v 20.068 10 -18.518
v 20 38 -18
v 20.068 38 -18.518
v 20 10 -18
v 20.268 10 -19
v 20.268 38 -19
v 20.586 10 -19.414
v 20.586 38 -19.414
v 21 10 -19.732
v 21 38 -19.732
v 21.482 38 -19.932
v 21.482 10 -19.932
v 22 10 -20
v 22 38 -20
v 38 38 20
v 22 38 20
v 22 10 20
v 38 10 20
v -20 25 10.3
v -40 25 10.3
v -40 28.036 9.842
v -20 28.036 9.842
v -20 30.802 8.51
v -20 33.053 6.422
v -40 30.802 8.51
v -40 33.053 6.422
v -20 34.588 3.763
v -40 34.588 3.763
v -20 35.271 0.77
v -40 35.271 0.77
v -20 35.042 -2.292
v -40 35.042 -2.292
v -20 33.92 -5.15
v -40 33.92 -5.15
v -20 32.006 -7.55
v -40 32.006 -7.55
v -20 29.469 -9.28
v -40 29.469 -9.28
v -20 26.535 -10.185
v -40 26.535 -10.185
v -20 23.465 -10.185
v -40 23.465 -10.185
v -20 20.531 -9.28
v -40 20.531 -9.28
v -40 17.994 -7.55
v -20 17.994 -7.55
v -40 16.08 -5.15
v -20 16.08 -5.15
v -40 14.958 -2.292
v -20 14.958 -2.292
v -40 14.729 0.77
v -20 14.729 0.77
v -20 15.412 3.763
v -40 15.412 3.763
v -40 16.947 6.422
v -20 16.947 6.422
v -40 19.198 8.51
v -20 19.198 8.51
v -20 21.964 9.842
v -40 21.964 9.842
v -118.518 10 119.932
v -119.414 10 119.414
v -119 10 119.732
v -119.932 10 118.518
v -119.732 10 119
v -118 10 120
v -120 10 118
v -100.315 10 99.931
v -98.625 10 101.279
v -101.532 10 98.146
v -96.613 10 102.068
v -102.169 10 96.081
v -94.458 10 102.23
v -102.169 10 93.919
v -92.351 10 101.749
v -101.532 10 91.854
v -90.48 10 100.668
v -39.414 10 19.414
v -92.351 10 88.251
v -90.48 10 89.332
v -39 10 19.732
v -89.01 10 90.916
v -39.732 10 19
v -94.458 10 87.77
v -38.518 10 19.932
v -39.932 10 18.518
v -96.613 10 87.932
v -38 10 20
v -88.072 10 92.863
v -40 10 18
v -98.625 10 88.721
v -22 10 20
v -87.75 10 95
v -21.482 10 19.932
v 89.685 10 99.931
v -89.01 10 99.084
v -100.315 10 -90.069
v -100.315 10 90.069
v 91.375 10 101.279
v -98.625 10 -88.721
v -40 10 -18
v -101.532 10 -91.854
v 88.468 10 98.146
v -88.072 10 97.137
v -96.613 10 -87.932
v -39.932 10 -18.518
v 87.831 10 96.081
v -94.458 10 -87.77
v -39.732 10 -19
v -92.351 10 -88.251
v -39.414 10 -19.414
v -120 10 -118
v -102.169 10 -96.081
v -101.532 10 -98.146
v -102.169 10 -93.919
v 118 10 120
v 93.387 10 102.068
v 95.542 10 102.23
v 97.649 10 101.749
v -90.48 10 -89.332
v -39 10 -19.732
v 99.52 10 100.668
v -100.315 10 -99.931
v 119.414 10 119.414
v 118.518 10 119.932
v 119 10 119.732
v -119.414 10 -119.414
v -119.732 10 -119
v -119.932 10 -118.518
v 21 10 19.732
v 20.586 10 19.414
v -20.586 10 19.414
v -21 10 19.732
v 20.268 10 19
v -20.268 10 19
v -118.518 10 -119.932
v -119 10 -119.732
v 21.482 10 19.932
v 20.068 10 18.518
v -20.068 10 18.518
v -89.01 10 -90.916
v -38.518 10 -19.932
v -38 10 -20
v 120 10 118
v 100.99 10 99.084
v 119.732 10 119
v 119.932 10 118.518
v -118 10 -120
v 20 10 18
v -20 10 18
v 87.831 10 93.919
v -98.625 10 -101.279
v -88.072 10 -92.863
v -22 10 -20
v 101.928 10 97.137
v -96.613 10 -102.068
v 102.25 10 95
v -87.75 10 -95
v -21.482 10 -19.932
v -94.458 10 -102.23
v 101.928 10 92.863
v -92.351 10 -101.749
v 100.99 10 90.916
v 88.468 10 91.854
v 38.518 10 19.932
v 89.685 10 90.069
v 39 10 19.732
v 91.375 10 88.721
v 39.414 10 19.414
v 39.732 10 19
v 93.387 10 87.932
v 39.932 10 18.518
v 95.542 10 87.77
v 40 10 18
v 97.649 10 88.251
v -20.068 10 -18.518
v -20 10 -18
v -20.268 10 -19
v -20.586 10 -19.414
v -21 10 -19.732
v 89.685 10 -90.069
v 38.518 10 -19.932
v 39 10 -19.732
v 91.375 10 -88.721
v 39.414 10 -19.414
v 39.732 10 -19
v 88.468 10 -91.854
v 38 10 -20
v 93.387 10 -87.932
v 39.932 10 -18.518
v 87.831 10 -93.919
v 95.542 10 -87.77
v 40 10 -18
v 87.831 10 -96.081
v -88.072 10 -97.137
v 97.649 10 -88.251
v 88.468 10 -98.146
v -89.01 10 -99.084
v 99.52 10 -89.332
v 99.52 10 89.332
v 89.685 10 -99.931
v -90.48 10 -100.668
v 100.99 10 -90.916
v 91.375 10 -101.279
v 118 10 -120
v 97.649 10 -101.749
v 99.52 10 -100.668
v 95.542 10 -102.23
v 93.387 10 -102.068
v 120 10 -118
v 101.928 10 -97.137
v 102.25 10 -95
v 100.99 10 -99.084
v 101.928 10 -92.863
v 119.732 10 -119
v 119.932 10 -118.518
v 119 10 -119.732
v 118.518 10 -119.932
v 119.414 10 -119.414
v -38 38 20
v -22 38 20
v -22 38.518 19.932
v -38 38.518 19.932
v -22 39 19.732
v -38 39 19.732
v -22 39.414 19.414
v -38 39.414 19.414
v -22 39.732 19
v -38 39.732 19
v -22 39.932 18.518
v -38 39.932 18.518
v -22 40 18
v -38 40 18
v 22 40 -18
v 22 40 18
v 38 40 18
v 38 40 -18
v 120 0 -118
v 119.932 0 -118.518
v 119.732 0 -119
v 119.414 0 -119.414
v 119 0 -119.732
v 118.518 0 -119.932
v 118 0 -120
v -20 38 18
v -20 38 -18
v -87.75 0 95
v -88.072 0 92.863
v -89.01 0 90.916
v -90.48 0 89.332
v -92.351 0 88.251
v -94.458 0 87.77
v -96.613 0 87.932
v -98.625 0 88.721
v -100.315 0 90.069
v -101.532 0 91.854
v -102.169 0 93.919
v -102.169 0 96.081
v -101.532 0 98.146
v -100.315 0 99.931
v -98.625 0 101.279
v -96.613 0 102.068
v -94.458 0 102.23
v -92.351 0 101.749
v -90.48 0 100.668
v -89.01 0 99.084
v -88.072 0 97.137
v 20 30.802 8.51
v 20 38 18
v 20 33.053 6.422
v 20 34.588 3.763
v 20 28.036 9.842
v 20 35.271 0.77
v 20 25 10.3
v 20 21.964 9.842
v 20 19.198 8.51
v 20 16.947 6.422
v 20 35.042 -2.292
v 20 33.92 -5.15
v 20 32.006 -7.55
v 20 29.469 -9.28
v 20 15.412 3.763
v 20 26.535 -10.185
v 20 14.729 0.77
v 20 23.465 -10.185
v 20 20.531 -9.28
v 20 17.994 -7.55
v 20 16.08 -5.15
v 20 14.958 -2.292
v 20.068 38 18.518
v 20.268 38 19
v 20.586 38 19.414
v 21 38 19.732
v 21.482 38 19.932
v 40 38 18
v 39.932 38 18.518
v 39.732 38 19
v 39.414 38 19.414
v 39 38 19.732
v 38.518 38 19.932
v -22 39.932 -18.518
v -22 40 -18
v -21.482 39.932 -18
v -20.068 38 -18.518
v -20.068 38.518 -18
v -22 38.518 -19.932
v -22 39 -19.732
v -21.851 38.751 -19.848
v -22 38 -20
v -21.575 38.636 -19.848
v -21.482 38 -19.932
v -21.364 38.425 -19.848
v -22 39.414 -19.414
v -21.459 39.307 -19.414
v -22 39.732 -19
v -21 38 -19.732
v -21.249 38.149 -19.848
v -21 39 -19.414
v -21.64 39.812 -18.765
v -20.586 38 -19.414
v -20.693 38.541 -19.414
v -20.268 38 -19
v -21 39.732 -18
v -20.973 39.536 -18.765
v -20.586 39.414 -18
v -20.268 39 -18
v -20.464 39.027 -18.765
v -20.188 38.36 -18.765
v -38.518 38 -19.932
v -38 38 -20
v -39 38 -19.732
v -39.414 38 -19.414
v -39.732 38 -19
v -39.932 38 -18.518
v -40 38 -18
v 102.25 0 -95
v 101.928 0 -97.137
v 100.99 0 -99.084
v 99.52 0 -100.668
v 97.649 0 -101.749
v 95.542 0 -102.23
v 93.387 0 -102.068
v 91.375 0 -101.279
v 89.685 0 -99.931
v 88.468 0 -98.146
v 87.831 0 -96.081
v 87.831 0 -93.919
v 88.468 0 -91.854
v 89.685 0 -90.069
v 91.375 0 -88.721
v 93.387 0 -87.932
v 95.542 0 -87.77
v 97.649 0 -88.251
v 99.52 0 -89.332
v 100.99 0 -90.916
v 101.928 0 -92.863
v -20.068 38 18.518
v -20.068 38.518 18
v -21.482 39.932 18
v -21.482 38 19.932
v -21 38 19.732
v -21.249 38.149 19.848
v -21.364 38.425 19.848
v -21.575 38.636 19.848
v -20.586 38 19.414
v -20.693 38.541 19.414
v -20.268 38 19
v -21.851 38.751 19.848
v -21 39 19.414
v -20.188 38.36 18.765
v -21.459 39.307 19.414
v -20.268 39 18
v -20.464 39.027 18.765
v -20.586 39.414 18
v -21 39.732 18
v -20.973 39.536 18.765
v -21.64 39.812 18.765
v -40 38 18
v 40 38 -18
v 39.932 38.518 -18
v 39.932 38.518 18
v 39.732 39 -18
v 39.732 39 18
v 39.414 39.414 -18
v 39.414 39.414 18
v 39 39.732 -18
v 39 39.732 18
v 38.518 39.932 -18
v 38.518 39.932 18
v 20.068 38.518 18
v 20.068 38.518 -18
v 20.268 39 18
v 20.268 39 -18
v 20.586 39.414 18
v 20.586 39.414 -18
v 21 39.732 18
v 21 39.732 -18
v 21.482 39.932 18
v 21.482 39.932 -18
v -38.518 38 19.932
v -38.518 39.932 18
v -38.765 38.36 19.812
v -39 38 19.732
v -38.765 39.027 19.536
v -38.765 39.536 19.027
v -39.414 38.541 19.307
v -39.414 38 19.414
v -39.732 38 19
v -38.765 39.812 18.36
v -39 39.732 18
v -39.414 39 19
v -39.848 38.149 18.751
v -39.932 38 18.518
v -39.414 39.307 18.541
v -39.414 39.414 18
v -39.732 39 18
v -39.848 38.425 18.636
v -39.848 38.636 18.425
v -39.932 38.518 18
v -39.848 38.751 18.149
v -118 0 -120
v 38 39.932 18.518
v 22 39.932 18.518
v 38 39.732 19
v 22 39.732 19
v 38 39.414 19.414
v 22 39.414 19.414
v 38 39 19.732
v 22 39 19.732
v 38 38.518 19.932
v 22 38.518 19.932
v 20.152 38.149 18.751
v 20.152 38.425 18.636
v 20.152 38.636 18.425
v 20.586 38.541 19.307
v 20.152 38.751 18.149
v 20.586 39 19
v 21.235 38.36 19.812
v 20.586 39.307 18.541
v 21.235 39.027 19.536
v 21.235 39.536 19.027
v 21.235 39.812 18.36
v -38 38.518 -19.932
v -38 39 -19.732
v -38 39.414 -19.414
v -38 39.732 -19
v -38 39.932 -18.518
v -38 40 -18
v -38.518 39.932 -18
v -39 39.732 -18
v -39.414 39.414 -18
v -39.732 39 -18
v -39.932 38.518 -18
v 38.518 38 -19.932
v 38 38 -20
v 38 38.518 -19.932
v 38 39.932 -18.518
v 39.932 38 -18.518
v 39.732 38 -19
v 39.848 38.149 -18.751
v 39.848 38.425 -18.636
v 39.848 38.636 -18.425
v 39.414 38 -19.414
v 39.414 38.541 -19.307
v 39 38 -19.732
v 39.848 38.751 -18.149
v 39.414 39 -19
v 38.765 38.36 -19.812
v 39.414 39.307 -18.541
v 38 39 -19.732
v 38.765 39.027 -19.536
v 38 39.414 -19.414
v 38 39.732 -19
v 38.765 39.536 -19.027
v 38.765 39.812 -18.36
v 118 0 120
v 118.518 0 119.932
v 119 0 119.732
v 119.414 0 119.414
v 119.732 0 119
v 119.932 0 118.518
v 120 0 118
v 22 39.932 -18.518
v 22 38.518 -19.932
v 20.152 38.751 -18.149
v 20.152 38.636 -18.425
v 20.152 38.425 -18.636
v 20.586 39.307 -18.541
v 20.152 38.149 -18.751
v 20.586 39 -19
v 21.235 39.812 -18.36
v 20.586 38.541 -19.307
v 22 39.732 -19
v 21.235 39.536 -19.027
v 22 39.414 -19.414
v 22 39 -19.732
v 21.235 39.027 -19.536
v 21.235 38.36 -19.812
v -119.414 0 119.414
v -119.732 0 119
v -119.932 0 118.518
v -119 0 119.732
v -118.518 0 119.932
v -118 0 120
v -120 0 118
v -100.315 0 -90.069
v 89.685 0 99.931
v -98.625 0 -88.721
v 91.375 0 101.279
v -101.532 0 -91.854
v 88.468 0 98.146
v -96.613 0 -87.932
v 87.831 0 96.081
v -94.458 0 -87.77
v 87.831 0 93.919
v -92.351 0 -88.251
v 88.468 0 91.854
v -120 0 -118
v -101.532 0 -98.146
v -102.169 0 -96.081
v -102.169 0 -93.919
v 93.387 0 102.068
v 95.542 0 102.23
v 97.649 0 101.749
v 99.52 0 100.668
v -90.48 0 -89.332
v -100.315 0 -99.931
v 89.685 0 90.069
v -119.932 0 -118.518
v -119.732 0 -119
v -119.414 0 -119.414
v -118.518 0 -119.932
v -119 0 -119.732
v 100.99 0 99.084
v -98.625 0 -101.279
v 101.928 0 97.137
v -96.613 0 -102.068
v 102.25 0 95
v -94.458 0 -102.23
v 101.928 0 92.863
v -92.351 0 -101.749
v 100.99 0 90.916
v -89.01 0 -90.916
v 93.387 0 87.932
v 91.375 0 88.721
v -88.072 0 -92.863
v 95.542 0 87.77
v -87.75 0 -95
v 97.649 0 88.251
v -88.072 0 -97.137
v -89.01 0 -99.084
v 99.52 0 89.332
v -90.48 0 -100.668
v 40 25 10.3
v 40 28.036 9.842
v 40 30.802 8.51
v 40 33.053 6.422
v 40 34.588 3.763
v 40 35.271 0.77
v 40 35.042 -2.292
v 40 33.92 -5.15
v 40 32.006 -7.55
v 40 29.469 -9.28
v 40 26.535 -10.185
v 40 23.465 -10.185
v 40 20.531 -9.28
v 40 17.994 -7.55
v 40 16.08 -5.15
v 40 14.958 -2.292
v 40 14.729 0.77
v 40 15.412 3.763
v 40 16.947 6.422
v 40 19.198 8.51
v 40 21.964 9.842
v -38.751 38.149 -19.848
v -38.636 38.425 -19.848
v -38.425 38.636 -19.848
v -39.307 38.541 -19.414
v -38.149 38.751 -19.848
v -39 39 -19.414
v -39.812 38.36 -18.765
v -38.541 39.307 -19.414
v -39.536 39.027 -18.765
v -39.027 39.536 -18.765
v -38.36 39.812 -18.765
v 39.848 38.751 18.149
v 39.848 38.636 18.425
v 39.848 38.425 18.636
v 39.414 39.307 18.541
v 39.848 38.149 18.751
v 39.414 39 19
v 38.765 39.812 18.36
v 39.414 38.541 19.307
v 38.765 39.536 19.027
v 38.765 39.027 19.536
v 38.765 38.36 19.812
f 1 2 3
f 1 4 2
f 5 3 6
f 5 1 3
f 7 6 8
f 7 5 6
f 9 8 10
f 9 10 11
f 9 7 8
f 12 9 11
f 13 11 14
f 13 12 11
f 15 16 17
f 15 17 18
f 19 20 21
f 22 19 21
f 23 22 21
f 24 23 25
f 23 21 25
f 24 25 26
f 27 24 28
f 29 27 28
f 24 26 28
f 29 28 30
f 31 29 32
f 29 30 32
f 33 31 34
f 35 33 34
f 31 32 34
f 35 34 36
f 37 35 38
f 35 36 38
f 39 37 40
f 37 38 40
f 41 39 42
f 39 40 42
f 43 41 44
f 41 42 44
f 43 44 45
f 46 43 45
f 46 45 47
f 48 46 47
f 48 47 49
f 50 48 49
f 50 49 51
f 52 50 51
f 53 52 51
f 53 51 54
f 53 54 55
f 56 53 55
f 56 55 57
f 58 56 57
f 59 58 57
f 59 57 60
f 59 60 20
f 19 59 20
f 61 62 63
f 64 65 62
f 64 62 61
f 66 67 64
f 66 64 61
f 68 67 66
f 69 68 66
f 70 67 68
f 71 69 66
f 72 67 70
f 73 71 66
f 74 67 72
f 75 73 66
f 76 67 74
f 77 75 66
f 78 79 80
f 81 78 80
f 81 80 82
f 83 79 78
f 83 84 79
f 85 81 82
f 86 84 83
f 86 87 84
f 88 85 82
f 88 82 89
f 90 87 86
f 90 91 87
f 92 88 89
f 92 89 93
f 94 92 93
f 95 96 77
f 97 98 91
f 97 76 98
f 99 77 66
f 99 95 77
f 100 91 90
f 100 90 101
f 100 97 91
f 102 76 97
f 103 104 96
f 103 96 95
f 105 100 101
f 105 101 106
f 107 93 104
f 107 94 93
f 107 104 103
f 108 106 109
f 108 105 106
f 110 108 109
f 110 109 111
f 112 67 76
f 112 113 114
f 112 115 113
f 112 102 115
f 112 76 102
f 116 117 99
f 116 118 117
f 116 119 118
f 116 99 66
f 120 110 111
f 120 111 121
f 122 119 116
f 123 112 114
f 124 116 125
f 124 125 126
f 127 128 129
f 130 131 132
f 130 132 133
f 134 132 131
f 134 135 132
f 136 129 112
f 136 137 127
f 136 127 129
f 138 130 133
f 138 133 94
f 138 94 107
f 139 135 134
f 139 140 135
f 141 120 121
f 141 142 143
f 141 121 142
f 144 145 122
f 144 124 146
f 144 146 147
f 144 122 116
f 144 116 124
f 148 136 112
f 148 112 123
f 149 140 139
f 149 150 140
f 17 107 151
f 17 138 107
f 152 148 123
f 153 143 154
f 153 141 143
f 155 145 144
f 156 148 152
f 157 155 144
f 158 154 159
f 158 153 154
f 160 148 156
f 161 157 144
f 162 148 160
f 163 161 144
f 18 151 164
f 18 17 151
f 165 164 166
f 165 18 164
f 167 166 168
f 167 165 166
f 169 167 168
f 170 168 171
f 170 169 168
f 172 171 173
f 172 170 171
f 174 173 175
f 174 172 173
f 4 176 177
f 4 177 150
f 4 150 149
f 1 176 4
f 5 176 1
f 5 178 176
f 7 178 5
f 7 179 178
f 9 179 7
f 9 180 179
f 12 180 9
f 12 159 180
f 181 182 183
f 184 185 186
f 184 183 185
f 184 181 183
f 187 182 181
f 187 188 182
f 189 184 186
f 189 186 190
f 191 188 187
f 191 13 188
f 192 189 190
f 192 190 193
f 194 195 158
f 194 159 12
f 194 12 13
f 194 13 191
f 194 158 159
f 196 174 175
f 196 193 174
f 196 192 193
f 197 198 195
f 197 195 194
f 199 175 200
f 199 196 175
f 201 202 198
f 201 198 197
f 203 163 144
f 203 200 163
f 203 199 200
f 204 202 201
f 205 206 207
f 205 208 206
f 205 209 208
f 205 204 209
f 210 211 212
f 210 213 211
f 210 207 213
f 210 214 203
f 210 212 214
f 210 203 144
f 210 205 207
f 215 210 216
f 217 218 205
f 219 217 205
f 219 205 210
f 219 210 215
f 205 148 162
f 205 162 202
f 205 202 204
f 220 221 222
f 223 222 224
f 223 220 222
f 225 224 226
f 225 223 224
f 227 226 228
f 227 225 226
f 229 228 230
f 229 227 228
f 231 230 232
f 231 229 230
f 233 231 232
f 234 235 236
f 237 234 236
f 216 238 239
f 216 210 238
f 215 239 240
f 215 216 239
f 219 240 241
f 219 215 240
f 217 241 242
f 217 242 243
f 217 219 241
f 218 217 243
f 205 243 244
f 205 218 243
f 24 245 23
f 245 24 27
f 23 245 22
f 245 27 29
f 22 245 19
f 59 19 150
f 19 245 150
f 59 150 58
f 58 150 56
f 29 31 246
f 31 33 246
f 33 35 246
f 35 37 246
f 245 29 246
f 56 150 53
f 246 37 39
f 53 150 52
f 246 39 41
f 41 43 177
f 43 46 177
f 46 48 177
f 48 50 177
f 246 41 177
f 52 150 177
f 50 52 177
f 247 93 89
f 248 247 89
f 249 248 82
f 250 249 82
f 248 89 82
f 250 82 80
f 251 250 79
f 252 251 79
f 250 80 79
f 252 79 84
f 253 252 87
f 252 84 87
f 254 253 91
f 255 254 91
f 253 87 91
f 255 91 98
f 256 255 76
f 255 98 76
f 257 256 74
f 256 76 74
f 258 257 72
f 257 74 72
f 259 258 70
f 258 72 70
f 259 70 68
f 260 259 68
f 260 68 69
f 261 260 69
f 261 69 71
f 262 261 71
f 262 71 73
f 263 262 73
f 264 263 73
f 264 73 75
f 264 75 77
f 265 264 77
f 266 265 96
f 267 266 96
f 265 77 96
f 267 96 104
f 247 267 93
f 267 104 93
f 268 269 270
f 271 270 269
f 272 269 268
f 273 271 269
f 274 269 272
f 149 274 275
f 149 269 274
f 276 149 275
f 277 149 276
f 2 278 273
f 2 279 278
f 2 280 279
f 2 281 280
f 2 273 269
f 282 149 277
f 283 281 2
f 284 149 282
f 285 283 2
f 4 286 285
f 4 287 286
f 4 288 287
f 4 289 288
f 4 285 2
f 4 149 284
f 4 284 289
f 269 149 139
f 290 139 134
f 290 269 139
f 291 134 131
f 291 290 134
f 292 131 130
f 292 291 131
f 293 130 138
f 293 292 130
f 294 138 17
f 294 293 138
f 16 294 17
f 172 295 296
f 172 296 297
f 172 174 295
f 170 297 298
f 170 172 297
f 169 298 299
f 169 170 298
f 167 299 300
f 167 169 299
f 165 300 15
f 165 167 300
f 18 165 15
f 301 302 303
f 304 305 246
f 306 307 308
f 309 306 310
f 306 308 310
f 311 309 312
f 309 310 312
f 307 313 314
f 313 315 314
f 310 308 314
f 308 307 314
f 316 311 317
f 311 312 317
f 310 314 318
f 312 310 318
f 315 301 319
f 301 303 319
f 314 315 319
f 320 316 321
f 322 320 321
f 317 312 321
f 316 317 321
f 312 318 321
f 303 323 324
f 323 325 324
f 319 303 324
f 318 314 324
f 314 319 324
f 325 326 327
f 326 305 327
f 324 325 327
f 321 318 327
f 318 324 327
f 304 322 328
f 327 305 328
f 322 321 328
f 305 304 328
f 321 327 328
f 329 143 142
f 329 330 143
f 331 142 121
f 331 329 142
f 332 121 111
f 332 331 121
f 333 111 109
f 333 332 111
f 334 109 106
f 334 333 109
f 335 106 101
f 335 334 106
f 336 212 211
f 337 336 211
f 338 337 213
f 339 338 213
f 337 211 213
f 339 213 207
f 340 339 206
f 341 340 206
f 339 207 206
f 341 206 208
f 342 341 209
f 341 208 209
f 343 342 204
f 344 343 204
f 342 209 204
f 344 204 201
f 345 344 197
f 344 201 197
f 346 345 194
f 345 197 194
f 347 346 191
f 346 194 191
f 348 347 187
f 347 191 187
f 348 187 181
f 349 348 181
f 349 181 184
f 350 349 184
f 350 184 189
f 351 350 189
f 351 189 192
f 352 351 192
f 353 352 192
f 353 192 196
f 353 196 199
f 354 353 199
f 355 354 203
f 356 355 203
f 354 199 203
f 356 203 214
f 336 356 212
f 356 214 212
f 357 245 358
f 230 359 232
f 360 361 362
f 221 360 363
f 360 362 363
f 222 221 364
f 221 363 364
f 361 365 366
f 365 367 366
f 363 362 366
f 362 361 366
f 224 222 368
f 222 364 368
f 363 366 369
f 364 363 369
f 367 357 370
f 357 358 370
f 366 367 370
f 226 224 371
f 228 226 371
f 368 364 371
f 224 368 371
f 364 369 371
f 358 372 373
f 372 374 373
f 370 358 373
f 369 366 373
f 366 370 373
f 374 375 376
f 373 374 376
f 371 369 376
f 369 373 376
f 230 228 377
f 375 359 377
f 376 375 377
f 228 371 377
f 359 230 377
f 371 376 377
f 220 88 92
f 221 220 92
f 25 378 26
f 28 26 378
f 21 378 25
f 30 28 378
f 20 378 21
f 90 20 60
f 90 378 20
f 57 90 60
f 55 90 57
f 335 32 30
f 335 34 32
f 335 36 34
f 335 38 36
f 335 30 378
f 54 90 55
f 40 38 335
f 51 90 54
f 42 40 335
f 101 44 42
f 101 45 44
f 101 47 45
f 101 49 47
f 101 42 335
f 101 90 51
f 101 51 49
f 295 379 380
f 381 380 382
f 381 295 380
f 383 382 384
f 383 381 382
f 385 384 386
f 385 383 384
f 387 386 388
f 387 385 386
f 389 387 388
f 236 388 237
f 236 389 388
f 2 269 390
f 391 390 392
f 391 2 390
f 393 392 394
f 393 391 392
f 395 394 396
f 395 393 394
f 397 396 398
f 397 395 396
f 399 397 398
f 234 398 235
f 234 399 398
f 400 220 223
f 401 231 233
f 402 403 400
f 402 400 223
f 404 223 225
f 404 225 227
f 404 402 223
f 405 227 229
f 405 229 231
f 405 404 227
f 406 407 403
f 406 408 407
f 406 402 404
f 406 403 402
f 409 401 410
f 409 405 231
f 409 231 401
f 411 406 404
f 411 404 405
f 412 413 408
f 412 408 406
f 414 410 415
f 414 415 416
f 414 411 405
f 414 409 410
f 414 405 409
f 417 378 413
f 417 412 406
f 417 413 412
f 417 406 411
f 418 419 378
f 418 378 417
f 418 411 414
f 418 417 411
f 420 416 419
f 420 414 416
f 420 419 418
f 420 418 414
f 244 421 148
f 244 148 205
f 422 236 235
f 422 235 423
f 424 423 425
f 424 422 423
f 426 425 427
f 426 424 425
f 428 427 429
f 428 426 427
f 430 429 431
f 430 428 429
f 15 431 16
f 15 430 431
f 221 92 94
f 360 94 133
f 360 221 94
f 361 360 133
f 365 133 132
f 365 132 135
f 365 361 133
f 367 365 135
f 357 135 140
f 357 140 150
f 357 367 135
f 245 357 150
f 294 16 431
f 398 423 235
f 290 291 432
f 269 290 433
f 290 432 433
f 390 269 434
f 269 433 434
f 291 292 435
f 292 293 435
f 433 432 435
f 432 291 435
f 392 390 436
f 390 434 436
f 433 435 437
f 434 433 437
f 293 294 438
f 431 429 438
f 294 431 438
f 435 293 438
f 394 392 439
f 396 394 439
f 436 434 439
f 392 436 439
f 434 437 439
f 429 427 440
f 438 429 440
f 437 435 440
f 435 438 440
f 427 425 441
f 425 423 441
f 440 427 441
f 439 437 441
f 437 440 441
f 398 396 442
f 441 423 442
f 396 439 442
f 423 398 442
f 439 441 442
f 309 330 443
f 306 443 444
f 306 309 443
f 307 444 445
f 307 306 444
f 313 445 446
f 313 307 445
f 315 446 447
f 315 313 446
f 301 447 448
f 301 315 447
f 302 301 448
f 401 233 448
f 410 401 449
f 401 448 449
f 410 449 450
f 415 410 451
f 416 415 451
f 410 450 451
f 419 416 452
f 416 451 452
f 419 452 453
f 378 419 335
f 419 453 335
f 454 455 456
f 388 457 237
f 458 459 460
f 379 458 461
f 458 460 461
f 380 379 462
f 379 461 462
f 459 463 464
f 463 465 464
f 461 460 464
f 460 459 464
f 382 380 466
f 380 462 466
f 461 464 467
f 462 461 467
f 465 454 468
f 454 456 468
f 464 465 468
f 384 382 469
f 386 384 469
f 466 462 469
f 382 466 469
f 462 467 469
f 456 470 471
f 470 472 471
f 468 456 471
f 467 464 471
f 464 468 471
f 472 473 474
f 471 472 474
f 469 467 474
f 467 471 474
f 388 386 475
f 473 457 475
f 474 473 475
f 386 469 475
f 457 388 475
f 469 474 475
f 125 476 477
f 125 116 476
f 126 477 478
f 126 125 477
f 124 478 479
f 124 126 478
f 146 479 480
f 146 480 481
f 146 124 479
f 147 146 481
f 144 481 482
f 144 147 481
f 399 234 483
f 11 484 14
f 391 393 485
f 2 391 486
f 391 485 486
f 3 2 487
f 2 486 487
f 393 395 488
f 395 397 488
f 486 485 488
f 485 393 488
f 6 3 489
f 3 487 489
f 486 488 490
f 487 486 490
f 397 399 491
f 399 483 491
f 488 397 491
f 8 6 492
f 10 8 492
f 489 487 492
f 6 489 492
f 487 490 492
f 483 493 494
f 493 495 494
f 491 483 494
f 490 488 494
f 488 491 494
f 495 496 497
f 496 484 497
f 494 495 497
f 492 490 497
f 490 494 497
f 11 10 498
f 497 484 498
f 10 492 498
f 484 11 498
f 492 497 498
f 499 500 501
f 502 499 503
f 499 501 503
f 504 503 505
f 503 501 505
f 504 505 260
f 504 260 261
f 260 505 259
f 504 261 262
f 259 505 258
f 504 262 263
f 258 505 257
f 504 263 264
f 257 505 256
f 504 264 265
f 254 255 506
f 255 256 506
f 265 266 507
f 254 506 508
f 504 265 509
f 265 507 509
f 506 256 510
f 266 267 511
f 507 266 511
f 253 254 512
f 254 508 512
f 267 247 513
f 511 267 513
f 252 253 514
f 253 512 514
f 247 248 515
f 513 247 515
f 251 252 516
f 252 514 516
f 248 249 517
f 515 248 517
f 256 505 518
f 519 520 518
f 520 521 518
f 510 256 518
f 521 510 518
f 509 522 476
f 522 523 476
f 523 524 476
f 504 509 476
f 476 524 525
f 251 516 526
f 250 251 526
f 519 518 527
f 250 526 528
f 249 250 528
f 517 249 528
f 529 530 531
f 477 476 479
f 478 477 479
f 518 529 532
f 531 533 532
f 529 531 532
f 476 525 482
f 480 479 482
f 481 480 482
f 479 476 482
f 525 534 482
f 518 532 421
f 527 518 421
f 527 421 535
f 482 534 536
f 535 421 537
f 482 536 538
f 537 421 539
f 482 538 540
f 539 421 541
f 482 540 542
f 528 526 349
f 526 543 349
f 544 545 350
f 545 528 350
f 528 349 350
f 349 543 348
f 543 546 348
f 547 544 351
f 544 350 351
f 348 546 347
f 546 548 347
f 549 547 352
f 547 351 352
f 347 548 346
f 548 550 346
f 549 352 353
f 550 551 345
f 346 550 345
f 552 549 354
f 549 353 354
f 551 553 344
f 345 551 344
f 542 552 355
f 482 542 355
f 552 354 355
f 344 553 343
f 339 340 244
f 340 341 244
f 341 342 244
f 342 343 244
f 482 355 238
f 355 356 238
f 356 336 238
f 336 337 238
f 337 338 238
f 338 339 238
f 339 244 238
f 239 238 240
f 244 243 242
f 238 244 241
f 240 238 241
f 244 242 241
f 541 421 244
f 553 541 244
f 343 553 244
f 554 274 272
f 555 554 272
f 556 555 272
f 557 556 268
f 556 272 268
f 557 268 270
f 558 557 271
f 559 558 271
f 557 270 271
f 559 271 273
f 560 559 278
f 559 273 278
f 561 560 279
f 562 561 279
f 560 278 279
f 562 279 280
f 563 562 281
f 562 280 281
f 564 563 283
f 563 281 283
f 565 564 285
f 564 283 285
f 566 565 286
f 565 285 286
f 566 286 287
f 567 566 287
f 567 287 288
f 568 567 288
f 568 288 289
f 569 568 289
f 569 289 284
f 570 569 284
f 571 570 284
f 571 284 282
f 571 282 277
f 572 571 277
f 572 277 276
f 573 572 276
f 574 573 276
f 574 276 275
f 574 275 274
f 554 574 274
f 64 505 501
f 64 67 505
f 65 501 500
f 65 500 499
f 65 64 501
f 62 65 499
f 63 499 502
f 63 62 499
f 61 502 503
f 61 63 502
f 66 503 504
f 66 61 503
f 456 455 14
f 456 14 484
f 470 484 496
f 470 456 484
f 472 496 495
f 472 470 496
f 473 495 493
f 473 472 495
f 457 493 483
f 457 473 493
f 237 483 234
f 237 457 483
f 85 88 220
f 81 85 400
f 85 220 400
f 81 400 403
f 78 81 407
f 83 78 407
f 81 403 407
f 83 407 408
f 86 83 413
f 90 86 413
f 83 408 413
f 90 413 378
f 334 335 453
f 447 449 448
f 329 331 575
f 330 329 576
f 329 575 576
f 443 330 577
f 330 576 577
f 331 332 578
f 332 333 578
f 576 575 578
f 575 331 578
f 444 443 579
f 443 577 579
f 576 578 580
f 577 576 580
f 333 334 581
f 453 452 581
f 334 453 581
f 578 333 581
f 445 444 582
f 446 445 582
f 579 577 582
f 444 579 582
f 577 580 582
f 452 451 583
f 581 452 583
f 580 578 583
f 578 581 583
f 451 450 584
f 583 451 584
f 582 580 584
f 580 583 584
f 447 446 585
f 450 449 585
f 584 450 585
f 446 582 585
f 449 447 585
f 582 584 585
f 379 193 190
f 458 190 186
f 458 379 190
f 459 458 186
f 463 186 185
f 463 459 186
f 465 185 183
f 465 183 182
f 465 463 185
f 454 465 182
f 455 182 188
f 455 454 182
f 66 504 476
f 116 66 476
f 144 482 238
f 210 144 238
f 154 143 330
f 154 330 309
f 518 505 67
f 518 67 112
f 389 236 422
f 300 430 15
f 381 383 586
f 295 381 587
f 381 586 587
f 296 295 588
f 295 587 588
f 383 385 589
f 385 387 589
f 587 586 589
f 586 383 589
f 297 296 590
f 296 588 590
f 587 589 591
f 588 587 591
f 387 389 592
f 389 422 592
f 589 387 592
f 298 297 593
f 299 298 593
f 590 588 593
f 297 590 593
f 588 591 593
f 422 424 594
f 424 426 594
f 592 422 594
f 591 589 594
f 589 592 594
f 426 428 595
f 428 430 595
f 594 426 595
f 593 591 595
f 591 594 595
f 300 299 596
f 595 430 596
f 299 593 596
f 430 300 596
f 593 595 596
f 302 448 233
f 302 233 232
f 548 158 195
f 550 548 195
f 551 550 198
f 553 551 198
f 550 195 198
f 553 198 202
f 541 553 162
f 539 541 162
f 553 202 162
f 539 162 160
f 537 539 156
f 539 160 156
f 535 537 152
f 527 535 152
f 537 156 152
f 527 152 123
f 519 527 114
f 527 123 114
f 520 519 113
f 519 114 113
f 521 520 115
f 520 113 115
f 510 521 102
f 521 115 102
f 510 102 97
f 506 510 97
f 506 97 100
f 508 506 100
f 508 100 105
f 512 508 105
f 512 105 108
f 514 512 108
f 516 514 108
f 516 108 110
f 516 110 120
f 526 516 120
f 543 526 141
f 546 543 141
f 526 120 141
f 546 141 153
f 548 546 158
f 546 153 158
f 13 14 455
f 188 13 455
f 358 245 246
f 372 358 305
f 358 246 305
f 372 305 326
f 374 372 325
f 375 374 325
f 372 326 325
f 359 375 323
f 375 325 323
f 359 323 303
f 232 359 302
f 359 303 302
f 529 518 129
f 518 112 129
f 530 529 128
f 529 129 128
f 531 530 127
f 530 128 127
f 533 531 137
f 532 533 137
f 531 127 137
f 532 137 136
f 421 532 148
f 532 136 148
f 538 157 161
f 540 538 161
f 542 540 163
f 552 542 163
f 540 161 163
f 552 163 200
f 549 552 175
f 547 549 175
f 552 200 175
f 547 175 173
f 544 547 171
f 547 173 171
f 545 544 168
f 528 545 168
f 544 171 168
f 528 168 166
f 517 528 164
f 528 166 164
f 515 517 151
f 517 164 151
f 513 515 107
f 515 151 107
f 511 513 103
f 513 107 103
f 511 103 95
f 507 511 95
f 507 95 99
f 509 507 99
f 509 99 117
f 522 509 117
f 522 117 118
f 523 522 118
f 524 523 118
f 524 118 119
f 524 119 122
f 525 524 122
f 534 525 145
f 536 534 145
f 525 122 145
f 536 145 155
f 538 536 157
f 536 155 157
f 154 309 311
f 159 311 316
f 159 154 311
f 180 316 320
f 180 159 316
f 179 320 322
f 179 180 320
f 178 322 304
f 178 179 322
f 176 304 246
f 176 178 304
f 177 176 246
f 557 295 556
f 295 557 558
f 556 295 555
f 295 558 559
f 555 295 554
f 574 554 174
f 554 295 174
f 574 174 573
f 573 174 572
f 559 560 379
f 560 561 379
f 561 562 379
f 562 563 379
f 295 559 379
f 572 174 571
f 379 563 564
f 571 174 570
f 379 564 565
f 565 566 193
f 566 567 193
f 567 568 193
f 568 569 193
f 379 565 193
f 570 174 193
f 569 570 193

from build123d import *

# Parameters (mm, degrees)
ESQUISSE1_W             = 240
ESQUISSE1_H             = 240
BOSS_EXTRU_1_DEPTH      = 10
ESQUISSE2_R             = 7.25
ENL_V_MAT_EXTRU_1_DEPTH = 10
ESQUISSE5_W             = 20
ESQUISSE5_H             = 40
BOSS_EXTRU_5_DEPTH      = 30
ESQUISSE7_R             = 10.3
ENL_V_MAT_EXTRU_2_DEPTH = 80
CONG_1_R                = 2
CONG_2_R                = 2
CONG_3_R                = 2
CONG_4_R                = 2
CONG_5_R                = 2
CONG_6_R                = 2
CONG_7_R                = 2
CONG_8_R                = 2
CONG_9_R                = 2
CONG_10_R               = 2
CONG_11_R               = 2
CONG_12_R               = 2


with BuildPart() as part:
    # Esquisse1 → Boss.-Extru.1 (new body)
    with BuildSketch(Plane(origin=(0, 0, 0), x_dir=(1, 0, 0), z_dir=(0, 1, 0))):
        Rectangle(ESQUISSE1_W, ESQUISSE1_H)
    extrude(amount=BOSS_EXTRU_1_DEPTH)

    # Esquisse2 → Enlèv. mat.-Extru.1 (cut)
    with BuildSketch(Plane(origin=(0, 10, 0), x_dir=(1, 0, 0), z_dir=(0, 1, 0))):
        with Locations((-95, -95)):
            Circle(ESQUISSE2_R)
        with Locations((-95, 95)):
            Circle(ESQUISSE2_R)
        with Locations((95, 95)):
            Circle(ESQUISSE2_R)
        with Locations((95, -95)):
            Circle(ESQUISSE2_R)
    extrude(amount=-ENL_V_MAT_EXTRU_1_DEPTH, mode=Mode.SUBTRACT)

    # Esquisse5 → Boss.-Extru.5 (add)
    with BuildSketch(Plane(origin=(0, 10, 0), x_dir=(1, 0, 0), z_dir=(0, 1, 0))):
        with Locations((-30, 0)):
            Rectangle(ESQUISSE5_W, ESQUISSE5_H)
        with Locations((30, 0)):
            Rectangle(ESQUISSE5_W, ESQUISSE5_H)
    extrude(amount=BOSS_EXTRU_5_DEPTH)

    # Esquisse7 → Enlèv. mat.-Extru.2 (cut)
    with BuildSketch(Plane.ZY.offset(40)):
        with Locations((0, 25)):
            Circle(ESQUISSE7_R)
    extrude(amount=-ENL_V_MAT_EXTRU_2_DEPTH, mode=Mode.SUBTRACT)

    # Congé1
    cong_1_edges = [part.edges().sort_by_distance(p)[0] for p in [
        (-120, 5, -120),
    ]]
    fillet(cong_1_edges, radius=CONG_1_R)

    # Congé2
    cong_2_edges = [part.edges().sort_by_distance(p)[0] for p in [
        (-120, 5, 120),
    ]]
    fillet(cong_2_edges, radius=CONG_2_R)

    # Congé3
    cong_3_edges = [part.edges().sort_by_distance(p)[0] for p in [
        (120, 5, 120),
    ]]
    fillet(cong_3_edges, radius=CONG_3_R)

    # Congé4
    cong_4_edges = [part.edges().sort_by_distance(p)[0] for p in [
        (120, 5, -120),
    ]]
    fillet(cong_4_edges, radius=CONG_4_R)

    # Congé5
    cong_5_edges = [part.edges().sort_by_distance(p)[0] for p in [
        (30, 40, -20),
    ]]
    fillet(cong_5_edges, radius=CONG_5_R)

    # Congé6
    cong_6_edges = [part.edges().sort_by_distance(p)[0] for p in [
        (30, 40, 20),
    ]]
    fillet(cong_6_edges, radius=CONG_6_R)

    # Congé7
    cong_7_edges = [part.edges().sort_by_distance(p)[0] for p in [
        (40, 24, -20),
        (40, 39.414213562, -19.414213562),
        (40, 40, 0),
        (40, 24, 20),
        (40, 39.414213562, 19.414213562),
    ]]
    fillet(cong_7_edges, radius=CONG_7_R)

    # Congé8
    cong_8_edges = [part.edges().sort_by_distance(p)[0] for p in [
        (-20, 40, 0),
    ]]
    fillet(cong_8_edges, radius=CONG_8_R)

    # Congé9
    cong_9_edges = [part.edges().sort_by_distance(p)[0] for p in [
        (-20, 24, 20),
        (-20.585786438, 39.414213562, 20),
        (-31, 40, 20),
    ]]
    fillet(cong_9_edges, radius=CONG_9_R)

    # Congé10
    cong_10_edges = [part.edges().sort_by_distance(p)[0] for p in [
        (-40, 24, 20),
        (-40, 39.414213562, 19.414213562),
        (-40, 40, -1),
    ]]
    fillet(cong_10_edges, radius=CONG_10_R)

    # Congé11
    cong_11_edges = [part.edges().sort_by_distance(p)[0] for p in [
        (-30, 40, -20),
        (-20, 24, -20),
        (-20.585786438, 39.414213562, -20),
        (-40, 24, -20),
        (-39.414213562, 39.414213562, -20),
    ]]
    fillet(cong_11_edges, radius=CONG_11_R)

    # Congé12
    cong_12_edges = [part.edges().sort_by_distance(p)[0] for p in [
        (20, 40, 0),
        (20, 24, -20),
        (20, 39.414213562, -19.414213562),
        (20, 24, 20),
        (20, 39.414213562, 19.414213562),
    ]]
    fillet(cong_12_edges, radius=CONG_12_R)


solid = part.part
